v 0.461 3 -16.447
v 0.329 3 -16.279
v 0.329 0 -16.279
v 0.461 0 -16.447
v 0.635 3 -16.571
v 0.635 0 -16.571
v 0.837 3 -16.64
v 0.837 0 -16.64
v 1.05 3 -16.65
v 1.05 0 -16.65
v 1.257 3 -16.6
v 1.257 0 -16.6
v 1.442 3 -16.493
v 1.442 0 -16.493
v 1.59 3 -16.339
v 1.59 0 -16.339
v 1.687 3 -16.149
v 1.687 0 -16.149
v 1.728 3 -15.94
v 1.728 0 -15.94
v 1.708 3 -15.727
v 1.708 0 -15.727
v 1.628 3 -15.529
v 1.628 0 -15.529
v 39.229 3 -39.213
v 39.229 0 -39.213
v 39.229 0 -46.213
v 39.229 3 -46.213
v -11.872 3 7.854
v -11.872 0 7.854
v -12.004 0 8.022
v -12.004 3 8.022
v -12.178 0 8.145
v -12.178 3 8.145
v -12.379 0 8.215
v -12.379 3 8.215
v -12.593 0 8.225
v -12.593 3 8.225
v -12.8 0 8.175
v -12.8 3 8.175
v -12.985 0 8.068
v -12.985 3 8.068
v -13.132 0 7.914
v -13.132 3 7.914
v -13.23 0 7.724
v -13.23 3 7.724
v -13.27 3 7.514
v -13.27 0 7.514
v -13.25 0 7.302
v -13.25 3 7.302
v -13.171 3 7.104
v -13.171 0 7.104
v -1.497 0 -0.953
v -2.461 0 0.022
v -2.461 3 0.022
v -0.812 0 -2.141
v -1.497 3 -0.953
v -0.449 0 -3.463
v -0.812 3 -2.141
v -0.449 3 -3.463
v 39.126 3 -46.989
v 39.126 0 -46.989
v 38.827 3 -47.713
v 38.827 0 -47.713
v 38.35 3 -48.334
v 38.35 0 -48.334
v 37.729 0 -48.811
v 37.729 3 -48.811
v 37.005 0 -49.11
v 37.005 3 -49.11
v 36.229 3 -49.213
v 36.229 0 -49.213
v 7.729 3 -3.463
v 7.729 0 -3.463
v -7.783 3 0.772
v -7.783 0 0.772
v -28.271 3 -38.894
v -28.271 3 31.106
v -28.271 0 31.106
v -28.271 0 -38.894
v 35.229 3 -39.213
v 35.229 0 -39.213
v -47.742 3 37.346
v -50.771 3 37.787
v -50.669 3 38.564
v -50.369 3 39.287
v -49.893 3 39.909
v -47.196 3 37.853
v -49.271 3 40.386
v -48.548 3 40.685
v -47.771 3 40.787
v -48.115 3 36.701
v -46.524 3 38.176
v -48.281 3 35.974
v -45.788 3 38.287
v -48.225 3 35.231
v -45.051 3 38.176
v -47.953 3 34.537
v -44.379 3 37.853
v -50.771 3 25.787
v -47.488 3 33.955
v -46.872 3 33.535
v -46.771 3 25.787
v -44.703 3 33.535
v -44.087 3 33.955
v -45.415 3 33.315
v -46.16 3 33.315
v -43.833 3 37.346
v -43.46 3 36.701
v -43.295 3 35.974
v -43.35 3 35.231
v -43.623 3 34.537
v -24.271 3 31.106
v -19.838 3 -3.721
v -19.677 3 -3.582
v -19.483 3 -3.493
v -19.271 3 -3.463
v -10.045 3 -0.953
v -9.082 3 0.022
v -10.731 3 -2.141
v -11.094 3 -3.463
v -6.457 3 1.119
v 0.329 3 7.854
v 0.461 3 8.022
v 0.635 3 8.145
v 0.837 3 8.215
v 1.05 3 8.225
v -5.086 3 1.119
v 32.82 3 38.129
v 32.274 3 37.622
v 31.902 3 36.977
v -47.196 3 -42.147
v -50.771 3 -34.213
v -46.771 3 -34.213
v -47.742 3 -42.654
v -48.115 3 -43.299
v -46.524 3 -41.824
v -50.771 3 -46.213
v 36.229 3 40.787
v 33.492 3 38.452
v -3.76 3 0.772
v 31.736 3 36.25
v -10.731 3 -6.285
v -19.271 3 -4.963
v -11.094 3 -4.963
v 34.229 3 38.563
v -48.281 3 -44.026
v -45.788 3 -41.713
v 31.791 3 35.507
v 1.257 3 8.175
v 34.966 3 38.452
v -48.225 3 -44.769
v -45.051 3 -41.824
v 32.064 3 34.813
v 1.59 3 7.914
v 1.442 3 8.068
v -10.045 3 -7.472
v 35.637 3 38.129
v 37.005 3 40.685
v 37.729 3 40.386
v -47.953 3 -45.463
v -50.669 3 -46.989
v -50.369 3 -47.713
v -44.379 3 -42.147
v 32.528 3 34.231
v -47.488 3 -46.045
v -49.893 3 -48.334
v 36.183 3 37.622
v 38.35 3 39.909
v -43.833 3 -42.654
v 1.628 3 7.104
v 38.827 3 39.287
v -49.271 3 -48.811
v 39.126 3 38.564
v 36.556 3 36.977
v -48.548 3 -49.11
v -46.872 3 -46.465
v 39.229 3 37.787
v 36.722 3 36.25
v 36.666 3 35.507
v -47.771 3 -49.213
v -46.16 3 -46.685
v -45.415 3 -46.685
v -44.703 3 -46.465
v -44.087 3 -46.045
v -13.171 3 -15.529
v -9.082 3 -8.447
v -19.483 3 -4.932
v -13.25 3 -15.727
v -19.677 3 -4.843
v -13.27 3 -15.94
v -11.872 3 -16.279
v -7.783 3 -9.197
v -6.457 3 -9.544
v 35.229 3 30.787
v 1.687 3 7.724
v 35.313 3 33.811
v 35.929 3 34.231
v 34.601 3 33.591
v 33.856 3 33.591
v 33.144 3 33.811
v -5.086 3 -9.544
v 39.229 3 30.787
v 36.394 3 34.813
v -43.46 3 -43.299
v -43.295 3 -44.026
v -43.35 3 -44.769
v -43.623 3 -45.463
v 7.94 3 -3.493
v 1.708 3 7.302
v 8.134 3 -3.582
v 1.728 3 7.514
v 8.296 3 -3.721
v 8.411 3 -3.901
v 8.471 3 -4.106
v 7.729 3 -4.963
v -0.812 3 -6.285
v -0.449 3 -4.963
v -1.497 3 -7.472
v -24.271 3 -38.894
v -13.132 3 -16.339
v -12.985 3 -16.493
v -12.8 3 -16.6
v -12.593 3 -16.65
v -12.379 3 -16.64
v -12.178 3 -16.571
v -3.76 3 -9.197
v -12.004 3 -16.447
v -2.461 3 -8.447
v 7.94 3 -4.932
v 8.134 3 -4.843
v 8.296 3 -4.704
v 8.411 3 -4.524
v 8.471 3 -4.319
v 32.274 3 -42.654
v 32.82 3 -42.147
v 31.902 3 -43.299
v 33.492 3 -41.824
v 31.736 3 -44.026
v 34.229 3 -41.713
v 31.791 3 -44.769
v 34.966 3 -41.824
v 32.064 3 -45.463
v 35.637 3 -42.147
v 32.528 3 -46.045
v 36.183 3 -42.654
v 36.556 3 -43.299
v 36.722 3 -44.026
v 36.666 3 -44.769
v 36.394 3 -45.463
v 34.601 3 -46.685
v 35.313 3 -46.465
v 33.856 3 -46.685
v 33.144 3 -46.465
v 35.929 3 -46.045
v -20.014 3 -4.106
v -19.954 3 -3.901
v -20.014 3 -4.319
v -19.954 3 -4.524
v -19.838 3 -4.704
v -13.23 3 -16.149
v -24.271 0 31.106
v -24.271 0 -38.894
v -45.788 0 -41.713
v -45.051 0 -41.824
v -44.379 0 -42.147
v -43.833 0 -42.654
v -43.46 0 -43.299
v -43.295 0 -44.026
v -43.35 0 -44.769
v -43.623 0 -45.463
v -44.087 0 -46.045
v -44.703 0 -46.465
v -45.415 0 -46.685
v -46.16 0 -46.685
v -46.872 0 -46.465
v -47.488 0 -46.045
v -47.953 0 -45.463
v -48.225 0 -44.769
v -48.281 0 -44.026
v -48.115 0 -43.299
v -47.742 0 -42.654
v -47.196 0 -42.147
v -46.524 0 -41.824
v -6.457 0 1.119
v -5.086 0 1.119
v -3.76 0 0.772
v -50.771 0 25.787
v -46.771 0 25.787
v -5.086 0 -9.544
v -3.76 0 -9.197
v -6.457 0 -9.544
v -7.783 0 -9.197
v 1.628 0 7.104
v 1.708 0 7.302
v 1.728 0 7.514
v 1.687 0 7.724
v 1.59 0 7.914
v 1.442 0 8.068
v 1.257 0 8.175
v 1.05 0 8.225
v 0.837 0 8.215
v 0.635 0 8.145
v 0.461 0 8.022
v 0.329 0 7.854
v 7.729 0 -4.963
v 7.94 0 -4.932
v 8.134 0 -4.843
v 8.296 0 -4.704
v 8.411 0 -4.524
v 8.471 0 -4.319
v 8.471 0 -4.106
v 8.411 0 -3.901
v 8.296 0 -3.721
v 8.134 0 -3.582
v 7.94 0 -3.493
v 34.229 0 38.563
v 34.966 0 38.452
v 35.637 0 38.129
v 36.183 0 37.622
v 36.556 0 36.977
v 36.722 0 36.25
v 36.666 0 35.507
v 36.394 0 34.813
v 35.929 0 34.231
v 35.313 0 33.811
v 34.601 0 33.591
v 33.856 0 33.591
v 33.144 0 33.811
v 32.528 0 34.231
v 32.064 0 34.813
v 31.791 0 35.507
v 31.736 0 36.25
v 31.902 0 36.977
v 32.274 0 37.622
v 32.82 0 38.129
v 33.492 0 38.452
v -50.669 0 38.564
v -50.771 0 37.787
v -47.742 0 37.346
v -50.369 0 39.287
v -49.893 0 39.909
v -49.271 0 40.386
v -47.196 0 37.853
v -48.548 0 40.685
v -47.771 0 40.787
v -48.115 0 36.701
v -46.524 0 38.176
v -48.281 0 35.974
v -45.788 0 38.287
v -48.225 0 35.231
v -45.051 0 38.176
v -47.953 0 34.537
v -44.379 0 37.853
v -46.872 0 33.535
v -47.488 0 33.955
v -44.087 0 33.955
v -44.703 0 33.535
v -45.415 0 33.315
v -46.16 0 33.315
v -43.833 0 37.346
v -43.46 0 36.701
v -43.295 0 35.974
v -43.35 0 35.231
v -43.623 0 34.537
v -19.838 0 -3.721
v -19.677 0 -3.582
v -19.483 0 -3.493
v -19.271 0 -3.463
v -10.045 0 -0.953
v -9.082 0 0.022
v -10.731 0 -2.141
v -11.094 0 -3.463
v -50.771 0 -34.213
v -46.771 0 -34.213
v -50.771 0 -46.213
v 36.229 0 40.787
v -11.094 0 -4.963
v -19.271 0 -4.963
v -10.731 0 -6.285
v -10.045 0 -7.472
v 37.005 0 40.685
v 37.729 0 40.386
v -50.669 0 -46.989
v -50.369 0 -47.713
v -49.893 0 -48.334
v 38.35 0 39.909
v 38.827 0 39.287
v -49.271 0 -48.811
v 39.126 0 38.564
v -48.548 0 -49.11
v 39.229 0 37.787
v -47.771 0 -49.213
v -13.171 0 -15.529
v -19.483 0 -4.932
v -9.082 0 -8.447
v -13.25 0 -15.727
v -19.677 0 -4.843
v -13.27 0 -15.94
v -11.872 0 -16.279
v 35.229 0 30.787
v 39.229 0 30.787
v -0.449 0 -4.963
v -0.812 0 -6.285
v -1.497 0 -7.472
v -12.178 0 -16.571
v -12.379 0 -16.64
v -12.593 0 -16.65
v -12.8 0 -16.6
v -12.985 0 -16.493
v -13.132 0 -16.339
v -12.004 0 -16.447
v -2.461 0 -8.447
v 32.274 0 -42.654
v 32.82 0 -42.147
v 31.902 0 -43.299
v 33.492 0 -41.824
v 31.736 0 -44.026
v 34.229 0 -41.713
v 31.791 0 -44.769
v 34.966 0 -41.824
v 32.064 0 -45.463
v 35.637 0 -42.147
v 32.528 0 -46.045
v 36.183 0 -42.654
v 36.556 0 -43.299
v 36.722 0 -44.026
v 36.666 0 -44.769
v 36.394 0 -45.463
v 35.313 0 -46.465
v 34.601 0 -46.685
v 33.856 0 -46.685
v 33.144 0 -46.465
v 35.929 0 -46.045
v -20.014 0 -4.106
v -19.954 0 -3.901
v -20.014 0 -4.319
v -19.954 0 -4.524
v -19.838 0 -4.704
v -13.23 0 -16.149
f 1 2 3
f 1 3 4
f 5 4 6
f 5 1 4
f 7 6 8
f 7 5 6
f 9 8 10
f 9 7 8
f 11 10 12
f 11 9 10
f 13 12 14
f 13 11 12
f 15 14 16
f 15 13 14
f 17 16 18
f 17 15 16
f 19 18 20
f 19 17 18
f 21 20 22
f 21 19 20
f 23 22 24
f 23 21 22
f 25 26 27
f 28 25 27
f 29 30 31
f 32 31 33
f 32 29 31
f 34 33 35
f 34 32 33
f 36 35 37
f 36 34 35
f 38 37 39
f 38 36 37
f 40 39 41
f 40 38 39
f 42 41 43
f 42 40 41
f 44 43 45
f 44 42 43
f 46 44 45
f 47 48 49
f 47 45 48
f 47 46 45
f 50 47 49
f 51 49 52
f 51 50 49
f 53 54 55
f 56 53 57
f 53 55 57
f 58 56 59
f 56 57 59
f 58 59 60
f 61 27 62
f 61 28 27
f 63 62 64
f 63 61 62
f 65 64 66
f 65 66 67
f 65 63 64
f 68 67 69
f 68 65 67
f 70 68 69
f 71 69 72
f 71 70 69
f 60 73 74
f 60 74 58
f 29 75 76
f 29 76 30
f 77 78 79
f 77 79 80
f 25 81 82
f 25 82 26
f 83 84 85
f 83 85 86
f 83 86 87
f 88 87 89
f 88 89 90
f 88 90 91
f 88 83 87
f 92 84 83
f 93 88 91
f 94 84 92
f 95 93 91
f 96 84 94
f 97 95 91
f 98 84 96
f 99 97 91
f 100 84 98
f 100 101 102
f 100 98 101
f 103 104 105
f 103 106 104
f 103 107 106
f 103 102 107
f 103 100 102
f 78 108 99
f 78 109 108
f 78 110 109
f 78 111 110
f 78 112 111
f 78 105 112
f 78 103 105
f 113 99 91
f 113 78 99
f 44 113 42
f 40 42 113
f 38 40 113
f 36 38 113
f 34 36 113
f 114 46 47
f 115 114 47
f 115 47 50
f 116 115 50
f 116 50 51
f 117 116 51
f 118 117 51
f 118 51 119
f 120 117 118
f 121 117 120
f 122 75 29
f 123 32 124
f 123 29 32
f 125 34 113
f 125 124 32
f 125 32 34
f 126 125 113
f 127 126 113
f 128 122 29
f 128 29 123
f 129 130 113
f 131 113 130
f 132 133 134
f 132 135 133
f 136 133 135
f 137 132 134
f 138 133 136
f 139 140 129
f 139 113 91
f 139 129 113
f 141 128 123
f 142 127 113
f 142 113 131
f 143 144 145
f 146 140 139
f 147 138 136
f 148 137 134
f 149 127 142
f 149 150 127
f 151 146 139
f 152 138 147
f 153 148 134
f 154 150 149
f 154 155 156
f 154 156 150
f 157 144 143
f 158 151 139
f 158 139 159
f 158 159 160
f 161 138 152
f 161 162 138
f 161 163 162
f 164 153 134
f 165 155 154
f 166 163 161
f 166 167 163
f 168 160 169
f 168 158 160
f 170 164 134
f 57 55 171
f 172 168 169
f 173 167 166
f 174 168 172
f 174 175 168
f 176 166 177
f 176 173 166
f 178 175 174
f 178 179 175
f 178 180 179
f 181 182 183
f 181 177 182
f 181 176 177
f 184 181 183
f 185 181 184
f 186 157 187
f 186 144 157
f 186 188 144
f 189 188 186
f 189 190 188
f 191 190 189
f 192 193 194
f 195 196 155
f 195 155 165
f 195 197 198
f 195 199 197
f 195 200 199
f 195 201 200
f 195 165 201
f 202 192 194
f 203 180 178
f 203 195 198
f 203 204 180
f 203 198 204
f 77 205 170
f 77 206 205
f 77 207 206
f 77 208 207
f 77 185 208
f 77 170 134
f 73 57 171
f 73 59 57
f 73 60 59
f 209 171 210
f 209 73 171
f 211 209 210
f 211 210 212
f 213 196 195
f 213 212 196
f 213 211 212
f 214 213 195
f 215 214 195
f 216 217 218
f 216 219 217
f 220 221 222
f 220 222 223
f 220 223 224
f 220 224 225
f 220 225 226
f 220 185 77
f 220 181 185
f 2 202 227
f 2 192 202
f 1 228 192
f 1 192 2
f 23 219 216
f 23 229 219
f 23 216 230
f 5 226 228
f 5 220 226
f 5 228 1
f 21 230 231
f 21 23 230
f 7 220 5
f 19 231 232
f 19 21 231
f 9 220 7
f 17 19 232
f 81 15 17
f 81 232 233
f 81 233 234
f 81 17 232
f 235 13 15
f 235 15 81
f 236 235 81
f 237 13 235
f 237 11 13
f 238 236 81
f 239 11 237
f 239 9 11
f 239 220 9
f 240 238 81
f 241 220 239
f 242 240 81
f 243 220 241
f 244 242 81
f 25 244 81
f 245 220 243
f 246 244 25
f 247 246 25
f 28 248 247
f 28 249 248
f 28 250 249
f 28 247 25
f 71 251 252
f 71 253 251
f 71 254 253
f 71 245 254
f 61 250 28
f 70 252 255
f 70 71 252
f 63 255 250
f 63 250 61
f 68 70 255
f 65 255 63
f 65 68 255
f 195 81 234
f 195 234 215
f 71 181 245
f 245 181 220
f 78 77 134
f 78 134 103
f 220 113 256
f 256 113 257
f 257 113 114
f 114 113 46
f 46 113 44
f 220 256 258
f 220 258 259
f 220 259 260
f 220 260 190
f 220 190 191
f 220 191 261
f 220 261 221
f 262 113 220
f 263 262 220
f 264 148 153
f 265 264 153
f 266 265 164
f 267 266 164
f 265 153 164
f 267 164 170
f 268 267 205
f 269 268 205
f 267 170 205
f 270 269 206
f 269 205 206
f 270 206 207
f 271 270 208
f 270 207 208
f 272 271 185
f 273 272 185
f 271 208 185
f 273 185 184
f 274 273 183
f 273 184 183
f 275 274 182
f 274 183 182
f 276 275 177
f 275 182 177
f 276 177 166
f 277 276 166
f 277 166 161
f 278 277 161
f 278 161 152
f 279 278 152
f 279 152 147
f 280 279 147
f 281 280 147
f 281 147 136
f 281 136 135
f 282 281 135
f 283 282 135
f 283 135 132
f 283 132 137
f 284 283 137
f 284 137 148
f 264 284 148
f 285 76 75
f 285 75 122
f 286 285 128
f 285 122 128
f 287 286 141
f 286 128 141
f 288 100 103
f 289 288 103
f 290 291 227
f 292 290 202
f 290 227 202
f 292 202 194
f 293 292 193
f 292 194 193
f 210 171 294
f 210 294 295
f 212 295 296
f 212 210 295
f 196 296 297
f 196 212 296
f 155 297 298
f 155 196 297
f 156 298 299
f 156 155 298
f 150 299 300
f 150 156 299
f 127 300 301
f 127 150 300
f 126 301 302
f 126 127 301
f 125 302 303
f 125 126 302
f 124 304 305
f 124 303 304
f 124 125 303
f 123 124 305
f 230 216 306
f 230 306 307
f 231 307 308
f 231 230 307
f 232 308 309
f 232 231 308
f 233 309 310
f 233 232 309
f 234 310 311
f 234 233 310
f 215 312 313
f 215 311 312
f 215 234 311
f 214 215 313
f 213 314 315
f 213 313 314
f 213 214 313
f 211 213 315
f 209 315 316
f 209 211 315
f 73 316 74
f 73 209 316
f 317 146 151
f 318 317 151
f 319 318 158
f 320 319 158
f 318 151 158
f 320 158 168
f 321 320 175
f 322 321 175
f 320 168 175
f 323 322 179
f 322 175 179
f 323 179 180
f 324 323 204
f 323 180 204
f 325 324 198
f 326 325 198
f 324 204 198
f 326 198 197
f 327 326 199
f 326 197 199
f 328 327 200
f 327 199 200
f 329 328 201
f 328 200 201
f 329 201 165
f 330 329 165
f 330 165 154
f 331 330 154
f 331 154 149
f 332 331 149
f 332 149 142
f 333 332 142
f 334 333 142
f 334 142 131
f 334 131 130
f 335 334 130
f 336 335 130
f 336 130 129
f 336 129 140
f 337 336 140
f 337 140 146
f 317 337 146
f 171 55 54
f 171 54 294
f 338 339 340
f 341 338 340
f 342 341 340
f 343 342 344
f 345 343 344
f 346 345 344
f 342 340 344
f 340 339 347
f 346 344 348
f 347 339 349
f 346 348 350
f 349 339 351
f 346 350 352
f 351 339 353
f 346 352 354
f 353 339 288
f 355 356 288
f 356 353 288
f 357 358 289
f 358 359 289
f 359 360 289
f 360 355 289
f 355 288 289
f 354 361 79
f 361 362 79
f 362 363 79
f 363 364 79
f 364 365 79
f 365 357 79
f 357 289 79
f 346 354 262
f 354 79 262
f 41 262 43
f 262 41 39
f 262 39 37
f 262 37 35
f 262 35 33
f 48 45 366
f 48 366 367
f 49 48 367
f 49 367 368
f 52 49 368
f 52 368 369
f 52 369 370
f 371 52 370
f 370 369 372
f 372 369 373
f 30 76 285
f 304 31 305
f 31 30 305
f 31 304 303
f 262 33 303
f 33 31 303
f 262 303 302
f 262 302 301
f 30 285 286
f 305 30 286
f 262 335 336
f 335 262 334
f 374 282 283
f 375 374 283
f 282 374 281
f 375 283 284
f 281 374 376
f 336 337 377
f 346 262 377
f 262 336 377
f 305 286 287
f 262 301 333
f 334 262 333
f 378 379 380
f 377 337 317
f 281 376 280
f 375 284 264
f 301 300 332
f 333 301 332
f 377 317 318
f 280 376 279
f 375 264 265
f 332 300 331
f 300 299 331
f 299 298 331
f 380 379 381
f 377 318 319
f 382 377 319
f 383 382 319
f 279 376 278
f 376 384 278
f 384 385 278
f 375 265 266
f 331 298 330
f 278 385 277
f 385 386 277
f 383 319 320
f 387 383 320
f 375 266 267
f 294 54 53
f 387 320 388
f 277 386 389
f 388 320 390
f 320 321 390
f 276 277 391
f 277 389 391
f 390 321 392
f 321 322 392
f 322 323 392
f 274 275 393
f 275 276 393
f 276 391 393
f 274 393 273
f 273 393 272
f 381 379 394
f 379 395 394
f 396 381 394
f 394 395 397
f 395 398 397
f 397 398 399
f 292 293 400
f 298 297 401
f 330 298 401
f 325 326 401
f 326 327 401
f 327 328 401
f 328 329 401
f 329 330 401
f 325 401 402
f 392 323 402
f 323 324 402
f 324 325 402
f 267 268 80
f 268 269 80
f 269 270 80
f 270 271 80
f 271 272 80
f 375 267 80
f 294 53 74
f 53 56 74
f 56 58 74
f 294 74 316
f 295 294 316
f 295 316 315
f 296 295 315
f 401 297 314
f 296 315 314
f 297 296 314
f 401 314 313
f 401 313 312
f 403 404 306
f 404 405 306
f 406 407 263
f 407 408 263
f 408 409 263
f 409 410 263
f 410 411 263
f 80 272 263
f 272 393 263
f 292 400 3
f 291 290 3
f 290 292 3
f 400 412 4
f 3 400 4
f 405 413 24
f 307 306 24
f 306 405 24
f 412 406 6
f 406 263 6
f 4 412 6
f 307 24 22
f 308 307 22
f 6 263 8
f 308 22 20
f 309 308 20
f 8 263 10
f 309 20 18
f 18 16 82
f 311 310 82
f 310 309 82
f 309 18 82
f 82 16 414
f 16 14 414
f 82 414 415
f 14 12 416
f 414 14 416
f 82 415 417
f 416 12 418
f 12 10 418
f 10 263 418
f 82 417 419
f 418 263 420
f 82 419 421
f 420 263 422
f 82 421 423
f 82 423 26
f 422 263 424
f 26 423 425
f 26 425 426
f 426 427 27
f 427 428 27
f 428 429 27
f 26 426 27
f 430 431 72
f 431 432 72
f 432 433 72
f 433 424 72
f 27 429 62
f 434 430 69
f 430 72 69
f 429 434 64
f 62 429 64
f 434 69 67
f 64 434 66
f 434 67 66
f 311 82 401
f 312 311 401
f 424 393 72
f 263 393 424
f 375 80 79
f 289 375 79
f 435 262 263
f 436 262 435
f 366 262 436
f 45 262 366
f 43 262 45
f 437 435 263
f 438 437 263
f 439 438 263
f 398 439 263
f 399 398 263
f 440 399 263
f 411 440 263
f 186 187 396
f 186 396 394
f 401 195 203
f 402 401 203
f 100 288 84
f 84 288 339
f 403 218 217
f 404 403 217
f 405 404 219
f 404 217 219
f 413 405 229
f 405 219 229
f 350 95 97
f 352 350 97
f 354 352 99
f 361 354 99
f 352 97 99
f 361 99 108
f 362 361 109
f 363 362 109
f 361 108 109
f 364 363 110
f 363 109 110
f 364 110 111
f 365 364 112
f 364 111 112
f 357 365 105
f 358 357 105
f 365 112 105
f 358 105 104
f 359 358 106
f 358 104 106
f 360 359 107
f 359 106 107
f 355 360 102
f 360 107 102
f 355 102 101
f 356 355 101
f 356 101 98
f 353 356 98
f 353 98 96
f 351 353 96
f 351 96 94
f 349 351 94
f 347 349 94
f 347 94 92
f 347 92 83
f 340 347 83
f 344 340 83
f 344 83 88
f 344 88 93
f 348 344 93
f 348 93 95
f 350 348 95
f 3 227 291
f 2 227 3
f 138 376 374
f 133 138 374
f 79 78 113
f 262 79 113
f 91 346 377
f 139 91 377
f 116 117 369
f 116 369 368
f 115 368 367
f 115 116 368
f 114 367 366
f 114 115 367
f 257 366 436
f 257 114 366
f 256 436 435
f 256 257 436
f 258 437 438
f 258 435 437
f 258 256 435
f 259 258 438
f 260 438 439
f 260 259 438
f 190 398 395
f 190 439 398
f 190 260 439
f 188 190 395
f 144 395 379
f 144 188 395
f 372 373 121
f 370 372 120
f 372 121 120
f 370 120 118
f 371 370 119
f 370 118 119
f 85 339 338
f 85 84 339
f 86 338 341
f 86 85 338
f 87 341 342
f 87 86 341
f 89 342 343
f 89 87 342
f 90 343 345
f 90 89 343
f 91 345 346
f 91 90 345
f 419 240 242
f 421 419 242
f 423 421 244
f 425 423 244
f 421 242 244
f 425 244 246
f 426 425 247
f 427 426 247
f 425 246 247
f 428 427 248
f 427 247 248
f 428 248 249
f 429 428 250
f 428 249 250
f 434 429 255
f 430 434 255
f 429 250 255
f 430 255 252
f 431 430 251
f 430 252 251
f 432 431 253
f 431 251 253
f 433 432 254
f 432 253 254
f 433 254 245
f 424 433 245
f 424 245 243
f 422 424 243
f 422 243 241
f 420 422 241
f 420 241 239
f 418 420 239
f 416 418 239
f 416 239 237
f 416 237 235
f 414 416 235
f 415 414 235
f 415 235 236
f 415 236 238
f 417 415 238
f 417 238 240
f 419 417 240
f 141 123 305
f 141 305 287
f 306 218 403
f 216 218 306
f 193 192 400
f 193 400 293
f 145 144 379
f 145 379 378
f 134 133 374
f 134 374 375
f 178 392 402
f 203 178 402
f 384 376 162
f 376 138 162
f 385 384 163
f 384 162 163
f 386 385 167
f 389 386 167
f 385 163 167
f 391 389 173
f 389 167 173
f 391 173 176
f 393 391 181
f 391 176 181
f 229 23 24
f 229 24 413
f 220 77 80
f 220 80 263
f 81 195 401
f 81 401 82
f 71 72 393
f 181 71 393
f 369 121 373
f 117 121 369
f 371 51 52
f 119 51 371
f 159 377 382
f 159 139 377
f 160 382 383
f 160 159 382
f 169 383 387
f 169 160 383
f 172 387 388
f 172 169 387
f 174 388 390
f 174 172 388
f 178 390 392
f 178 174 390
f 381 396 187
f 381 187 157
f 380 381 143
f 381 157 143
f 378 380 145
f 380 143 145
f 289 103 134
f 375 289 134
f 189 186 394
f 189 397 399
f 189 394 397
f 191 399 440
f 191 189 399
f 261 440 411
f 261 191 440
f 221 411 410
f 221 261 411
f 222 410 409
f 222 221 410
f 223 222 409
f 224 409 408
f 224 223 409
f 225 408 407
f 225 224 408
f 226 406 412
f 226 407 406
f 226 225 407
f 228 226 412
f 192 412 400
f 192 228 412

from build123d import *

# Parameters (mm, degrees)
SKETCH1_W           = 4
SKETCH1_H           = 70
SKETCH1_H_2         = 60
BOSS_EXTRUDE1_DEPTH = 3
SKETCH1_3_W         = 4
SKETCH1_3_H         = 60
SKETCH1_3_H_2       = 70
BOSS_EXTRUDE2_DEPTH = 70
SKETCH1_4_W         = 4
SKETCH1_4_H         = 70
BOSS_EXTRUDE3_DEPTH = 70
SKETCH5_R           = 4
CUT_EXTRUDE4_DEPTH  = 10
SKETCH6_R           = 2.5
CUT_EXTRUDE5_DEPTH  = 10
SKETCH1_5_W         = 4
SKETCH1_5_H         = 60
BOSS_EXTRUDE4_DEPTH = 80
SKETCH5_2_R         = 4
CUT_EXTRUDE6_DEPTH  = 10
FILLET1_R           = 3
FILLET2_R           = 5
FILLET3_R           = 4
SKETCH7_R           = 2.5
CUT_EXTRUDE7_DEPTH  = 10
SKETCH8_R           = 2.5
CUT_EXTRUDE8_DEPTH  = 10
CUT_EXTRUDE9_REACH  = 132.084
SKETCH9_R           = 3.5
SKETCH26_R          = 2.5
CUT_EXTRUDE11_DEPTH = 10
CUT_EXTRUDE14_DEPTH = 10
CUT_EXTRUDE15_DEPTH = 10
SKETCH28_R          = 1
SKETCH28_R_2        = 4
CUT_EXTRUDE16_DEPTH = 4
SKETCH29_R          = 1
SKETCH29_R_2        = 3.5
CUT_EXTRUDE18_DEPTH = 4
SKETCH31_R          = 5.375
CUT_EXTRUDE19_DEPTH = 10
SKETCH32_W          = 71.641660037
SKETCH32_H          = 79.51751689
CUT_EXTRUDE20_DEPTH = 131.084107183
SKETCH33_W          = 4
SKETCH33_H          = 70
SKETCH33_H_2        = 60
CUT_EXTRUDE21_DEPTH = 71.771465692


with BuildPart() as part:
    # Sketch1 → Boss-Extrude1 (new body)
    # profile 1 of 4: a face of its own
    with BuildSketch(Plane(origin=(0, 0, 0), x_dir=(1, 0, 0), z_dir=(0, 1, 0))):
        Polygon((-50.771305032, 49.212548619), (-50.771305032, 34.212548619), (-46.771305032, 34.212548619), (-46.771305032, -25.787451381), (-50.771305032, -25.787451381), (-50.771305032, -40.787451381), (39.228694968, -40.787451381), (39.228694968, -30.787451381), (35.228694968, -30.787451381), (35.228694968, 39.212548619), (39.228694968, 39.212548619), (39.228694968, 49.212548619), align=None)
        with Locations((-26.271305032, 3.893815937)):
            Rectangle(SKETCH1_W, SKETCH1_H, mode=Mode.SUBTRACT)
    # profile 2 of 4: a face of its own
    with BuildSketch(Plane(origin=(0, 0, 0), x_dir=(1, 0, 0), z_dir=(0, 1, 0))):
        with Locations((37.228694968, 4.212548619)):
            Rectangle(SKETCH1_W, SKETCH1_H)
    # profile 3 of 4: a face of its own
    with BuildSketch(Plane(origin=(0, 0, 0), x_dir=(1, 0, 0), z_dir=(0, 1, 0))):
        with Locations((-48.771305032, 4.212548619)):
            Rectangle(SKETCH1_W, SKETCH1_H_2)
    # profile 4 of 4: a face of its own
    with BuildSketch(Plane(origin=(0, 0, 0), x_dir=(1, 0, 0), z_dir=(0, 1, 0))):
        with Locations((-26.271305032, 3.893815937)):
            Rectangle(SKETCH1_W, SKETCH1_H)
    extrude(amount=BOSS_EXTRUDE1_DEPTH)

    # Sketch1<3> → Boss-Extrude2 (add)
    with BuildSketch(Plane(origin=(0, 0, 0), x_dir=(1, 0, 0), z_dir=(0, 1, 0))):
        with Locations((-48.771305032, 4.212548619)):
            Rectangle(SKETCH1_3_W, SKETCH1_3_H)
        with Locations((37.228694968, 4.212548619)):
            Rectangle(SKETCH1_3_W, SKETCH1_3_H_2)
    extrude(amount=BOSS_EXTRUDE2_DEPTH)

    # Sketch1<4> → Boss-Extrude3 (add)
    with BuildSketch(Plane(origin=(0, 0, 0), x_dir=(1, 0, 0), z_dir=(0, 1, 0))):
        with Locations((-26.271305032, 3.893815937)):
            Rectangle(SKETCH1_4_W, SKETCH1_4_H)
    extrude(amount=BOSS_EXTRUDE3_DEPTH)

    # Sketch5 → Cut-Extrude4 (cut)
    with BuildSketch(Plane.ZY.offset(50.771305032)):
        with Locations((-8.022548619, 60)):
            Circle(SKETCH5_R)
    extrude(amount=-CUT_EXTRUDE4_DEPTH, mode=Mode.SUBTRACT)

    # Sketch6 → Cut-Extrude5 (cut)
    with BuildSketch(Plane(origin=(0, 3, 0), x_dir=(1, 0, 0), z_dir=(0, 1, 0))):
        with Locations(Location((-45.787574368, -35.787451381, 0), (0, 0, 270))):
            Circle(SKETCH6_R)
        with Locations(Location((-45.787574368, 44.212548619, 0), (0, 0, 270))):
            Circle(SKETCH6_R)
        with Locations((43.718511914, 44.212548619)):
            Circle(SKETCH6_R)
        with Locations((43.718511914, -35.787451381)):
            Circle(SKETCH6_R)
    extrude(amount=-CUT_EXTRUDE5_DEPTH, mode=Mode.SUBTRACT)

    # Sketch1<5> → Boss-Extrude4 (add)
    with BuildSketch(Plane(origin=(0, 0, 0), x_dir=(1, 0, 0), z_dir=(0, 1, 0))):
        with Locations((-48.771305032, 4.212548619)):
            Rectangle(SKETCH1_5_W, SKETCH1_5_H)
    extrude(amount=BOSS_EXTRUDE4_DEPTH)

    # Sketch5<2> → Cut-Extrude6 (cut)
    with BuildSketch(Plane.ZY.offset(50.771305032)):
        with Locations((-8.022548619, 60)):
            Circle(SKETCH5_2_R)
    extrude(amount=-CUT_EXTRUDE6_DEPTH, mode=Mode.SUBTRACT)

    # Fillet1
    fillet1_edges = [part.edges().sort_by_distance(p)[0] for p in [
        (-50.771305032, 1.5, 40.787451381),
        (-50.771305032, 1.5, -49.212548619),
        (39.228694968, 1.5, -49.212548619),
        (39.228694968, 1.5, 40.787451381),
    ]]
    fillet(fillet1_edges, radius=FILLET1_R)

    # Fillet2
    fillet2_edges = [part.edges().sort_by_distance(p)[0] for p in [
        (-48.771305032, 80, -34.212548619),
        (-48.771305032, 80, 25.787451381),
        (37.228694968, 70, -39.212548619),
        (37.228694968, 70, 30.787451381),
    ]]
    fillet(fillet2_edges, radius=FILLET2_R)

    # Fillet3
    fillet3_edges = [part.edges().sort_by_distance(p)[0] for p in [
        (-26.271305032, 70, 31.106184063),
        (-26.271305032, 70, -38.893815937),
    ]]
    fillet(fillet3_edges, radius=FILLET3_R)

    # Sketch7 → Cut-Extrude7 (cut)
    with BuildSketch(Plane(origin=(39.228694968, 0, 0), x_dir=(0, 0, -1), z_dir=(1, 0, 0))):
        with Locations((27.482306935, -10)):
            Circle(SKETCH7_R)
    extrude(amount=-CUT_EXTRUDE7_DEPTH, mode=Mode.SUBTRACT)

    # Sketch8 → Cut-Extrude8 (cut)
    with BuildSketch(Plane(origin=(39.228694968, 0, 0), x_dir=(0, 0, -1), z_dir=(1, 0, 0))):
        with Locations((8.02072759, 38.893893193)):
            Circle(SKETCH8_R)
    extrude(amount=-CUT_EXTRUDE8_DEPTH, mode=Mode.SUBTRACT)

    # Cut-Extrude9: up to this face of the body (flat: up to its plane)
    cut_extrude9_end = Plane(part.part.faces().sort_by_distance((-28.271305032, 36.452186393, -3.893815937))[0])
    # Sketch9 → Cut-Extrude9 (cut, up to the picked face)
    with BuildSketch(Plane(origin=(39.228694968, 0, 0), x_dir=(0, 0, -1), z_dir=(1, 0, 0)), mode=Mode.PRIVATE) as cut_extrude9_sk1:
        with Locations((8.02072759, 38.893893193)):
            Circle(SKETCH9_R)
    cut_extrude9_tool1 = split(extrude(cut_extrude9_sk1.sketch, amount=-CUT_EXTRUDE9_REACH, mode=Mode.PRIVATE), bisect_by=cut_extrude9_end, keep=Keep.BOTH, mode=Mode.PRIVATE)
    add(cut_extrude9_tool1.solids().sort_by(Axis((39.228695, 38.893893, -8.020728), (-1, 0, 0)))[0], mode=Mode.SUBTRACT)

    # Sketch26 → Cut-Extrude11 (cut)
    with BuildSketch(Plane(origin=(0, 3, 0), x_dir=(1, 0, 0), z_dir=(0, 1, 0))):
        with Locations(Location((34.228694968, -36.063353705, 0), (0, 0, 270))):
            Circle(SKETCH26_R)
        with Locations(Location((34.228694968, 44.212548619, 0), (0, 0, 270))):
            Circle(SKETCH26_R)
    extrude(amount=-CUT_EXTRUDE11_DEPTH, mode=Mode.SUBTRACT)

    # Sketch27 → Cut-Extrude14 (cut)
    with BuildSketch(Plane(origin=(0, 3, 0), x_dir=(1, 0, 0), z_dir=(0, 1, 0))):
        with BuildLine():
            Line((7.728694968, 3.462548619), (-19.271305032, 3.462548619))
            ThreePointArc((-19.271305032, 3.462548619), (-20.021305032, 4.212548619), (-19.271305032, 4.962548619))
            Line((-19.271305032, 4.962548619), (7.728694968, 4.962548619))
            ThreePointArc((7.728694968, 4.962548619), (8.478694968, 4.212548619), (7.728694968, 3.462548619))
        make_face()
        with BuildLine():
            Line((0.329175915, -7.853794332), (-13.170824085, 15.52889157))
            ThreePointArc((-13.170824085, 15.52889157), (-12.896305032, 16.553410623), (-11.871785979, 16.27889157))
            Line((-11.871785979, 16.27889157), (1.628214021, -7.103794332))
            ThreePointArc((1.628214021, -7.103794332), (1.353694968, -8.128313385), (0.329175915, -7.853794332))
        make_face()
        with BuildLine():
            Line((-13.170824085, -7.103794332), (0.329175915, 16.27889157))
            ThreePointArc((0.329175915, 16.27889157), (1.353694968, 16.553410623), (1.628214021, 15.52889157))
            Line((1.628214021, 15.52889157), (-11.871785979, -7.853794332))
            ThreePointArc((-11.871785979, -7.853794332), (-12.896305032, -8.128313385), (-13.170824085, -7.103794332))
        make_face()
    extrude(amount=-CUT_EXTRUDE14_DEPTH, mode=Mode.SUBTRACT)

    # Sketch27<7> → Cut-Extrude15 (cut)
    with BuildSketch(Plane(origin=(0, 3, 0), x_dir=(1, 0, 0), z_dir=(0, 1, 0))):
        with BuildLine():
            Line((-7.743699741, 2.296260771), (-7.070343138, 3.462548619))
            Line((-7.070343138, 3.462548619), (-8.417056343, 3.462548619))
            ThreePointArc((-8.417056343, 3.462548619), (-8.152874893, 2.837548619), (-7.743699741, 2.296260771))
        make_face()
        with BuildLine():
            Line((-8.417056343, 4.962548619), (-7.070343138, 4.962548619))
            Line((-7.070343138, 4.962548619), (-7.743699741, 6.128836466))
            ThreePointArc((-7.743699741, 6.128836466), (-8.152874893, 5.587548619), (-8.417056343, 4.962548619))
        make_face()
        with BuildLine():
            Line((-5.771305032, 5.712548619), (-5.09794843, 6.878836466))
            ThreePointArc((-5.09794843, 6.878836466), (-5.771305032, 6.962548619), (-6.444661635, 6.878836466))
            Line((-6.444661635, 6.878836466), (-5.771305032, 5.712548619))
        make_face()
        with BuildLine():
            Line((-4.472266927, 4.962548619), (-3.125553721, 4.962548619))
            ThreePointArc((-3.125553721, 4.962548619), (-3.389735172, 5.587548619), (-3.798910324, 6.128836466))
            Line((-3.798910324, 6.128836466), (-4.472266927, 4.962548619))
        make_face()
        with BuildLine():
            ThreePointArc((-3.798910324, 2.296260771), (-3.389735172, 2.837548619), (-3.125553721, 3.462548619))
            Line((-3.125553721, 3.462548619), (-4.472266927, 3.462548619))
            Line((-4.472266927, 3.462548619), (-3.798910324, 2.296260771))
        make_face()
        with BuildLine():
            ThreePointArc((-6.444661635, 1.546260771), (-5.771305032, 1.462548619), (-5.09794843, 1.546260771))
            Line((-5.09794843, 1.546260771), (-5.771305032, 2.712548619))
            Line((-5.771305032, 2.712548619), (-6.444661635, 1.546260771))
        make_face()
    extrude(amount=-CUT_EXTRUDE15_DEPTH, mode=Mode.SUBTRACT)

    # Sketch28 → Cut-Extrude16 (cut)
    # profile 1 of 3: a face of its own
    with BuildSketch(Plane.ZY.offset(50.771305032)):
        with Locations((-2.316893756, 66.434710762)):
            Circle(SKETCH28_R)
    # profile 2 of 3: a face of its own
    with BuildSketch(Plane.ZY.offset(50.771305032)):
        with Locations((-20.69441, 45.708956331)):
            Circle(SKETCH28_R)
    # profile 3 of 3: a face of its own
    with BuildSketch(Plane.ZY.offset(50.771305032)):
        Polygon((-23.458777666, 51.635023443), (-8.531192269, 68.470022529), (0.44747391, 60.508643651), (-14.480111487, 43.673644564), align=None)
        with Locations((-8.022548619, 60)):
            Circle(SKETCH28_R_2, mode=Mode.SUBTRACT)
    extrude(amount=-CUT_EXTRUDE16_DEPTH, mode=Mode.SUBTRACT)

    # Sketch29 → Cut-Extrude18 (cut)
    # profile 1 of 3: a face of its own
    with BuildSketch(Plane(origin=(39.228694968, 0, 0), x_dir=(0, 0, -1), z_dir=(1, 0, 0))):
        with Locations((2.315072727, 45.328603955)):
            Circle(SKETCH29_R)
    # profile 2 of 3: a face of its own
    with BuildSketch(Plane(origin=(39.228694968, 0, 0), x_dir=(0, 0, -1), z_dir=(1, 0, 0))):
        with Locations((20.692588971, 24.602849525)):
            Circle(SKETCH29_R)
    # profile 3 of 3: a face of its own
    with BuildSketch(Plane(origin=(39.228694968, 0, 0), x_dir=(0, 0, -1), z_dir=(1, 0, 0))):
        Polygon((8.529371241, 47.363915722), (23.456956637, 30.528916636), (14.478290458, 22.567537758), (-0.449294939, 39.402536844), align=None)
        with Locations((8.02072759, 38.893893193)):
            Circle(SKETCH29_R_2, mode=Mode.SUBTRACT)
    extrude(amount=-CUT_EXTRUDE18_DEPTH, mode=Mode.SUBTRACT)

    # Sketch31 → Cut-Extrude19 (cut)
    with BuildSketch(Plane(origin=(0, 3, 0), x_dir=(1, 0, 0), z_dir=(0, 1, 0))):
        with Locations((-5.771305032, 4.212548619)):
            Circle(SKETCH31_R)
    extrude(amount=-CUT_EXTRUDE19_DEPTH, mode=Mode.SUBTRACT)

    # Sketch32 → Cut-Extrude20 (cut, through all)
    with BuildSketch(Plane(origin=(39.228694968, 0, 0), x_dir=(0, 0, -1), z_dir=(1, 0, 0))):
        with Locations((4.714645955, 42.758758445)):
            Rectangle(SKETCH32_W, SKETCH32_H)
    extrude(amount=-CUT_EXTRUDE20_DEPTH, mode=Mode.SUBTRACT)

    # Sketch33 → Cut-Extrude21 (cut, through all)
    with BuildSketch(Plane(origin=(0, 3, 0), x_dir=(1, 0, 0), z_dir=(0, 1, 0))):
        with Locations((-26.271305032, 3.893815937)):
            Rectangle(SKETCH33_W, SKETCH33_H)
        with Locations((-48.771305032, 4.212548619)):
            Rectangle(SKETCH33_W, SKETCH33_H_2)
        with Locations((37.228694968, 4.212548619)):
            Rectangle(SKETCH33_W, SKETCH33_H)
    extrude(amount=-CUT_EXTRUDE21_DEPTH, mode=Mode.SUBTRACT)


solid = part.part
